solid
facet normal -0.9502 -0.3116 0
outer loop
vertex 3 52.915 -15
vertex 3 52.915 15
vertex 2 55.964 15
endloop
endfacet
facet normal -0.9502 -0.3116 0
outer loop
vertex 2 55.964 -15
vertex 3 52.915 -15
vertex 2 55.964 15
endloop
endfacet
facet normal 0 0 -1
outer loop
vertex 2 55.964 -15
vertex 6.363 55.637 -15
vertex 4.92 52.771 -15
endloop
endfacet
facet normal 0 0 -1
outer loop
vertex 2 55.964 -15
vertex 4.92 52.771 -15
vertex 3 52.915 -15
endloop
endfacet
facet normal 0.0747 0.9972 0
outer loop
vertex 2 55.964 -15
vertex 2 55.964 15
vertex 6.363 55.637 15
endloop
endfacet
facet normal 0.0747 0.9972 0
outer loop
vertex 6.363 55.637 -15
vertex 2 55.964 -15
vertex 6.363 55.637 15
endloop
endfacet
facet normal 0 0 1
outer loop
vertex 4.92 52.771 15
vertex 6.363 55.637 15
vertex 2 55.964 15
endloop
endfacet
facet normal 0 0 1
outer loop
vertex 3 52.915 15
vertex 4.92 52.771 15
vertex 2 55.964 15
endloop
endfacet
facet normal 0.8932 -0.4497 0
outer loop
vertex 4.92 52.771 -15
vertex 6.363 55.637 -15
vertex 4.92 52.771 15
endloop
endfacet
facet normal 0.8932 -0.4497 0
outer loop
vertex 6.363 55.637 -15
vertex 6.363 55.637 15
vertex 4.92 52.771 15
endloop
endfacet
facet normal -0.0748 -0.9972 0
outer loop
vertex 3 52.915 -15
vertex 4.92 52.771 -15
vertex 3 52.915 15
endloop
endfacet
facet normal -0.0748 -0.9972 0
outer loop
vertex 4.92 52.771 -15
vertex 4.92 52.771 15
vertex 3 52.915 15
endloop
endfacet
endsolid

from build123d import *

# Parameters (mm, degrees)
SKETCH_1_R      = 50
EXTRUDE_1_DEPTH = 15
SKETCH_2_R      = 50
SKETCH_2_R_2    = 15
EXTRUDE_2_DEPTH = 25
EXTRUDE_3_DEPTH = 15


with BuildPart() as part:
    # Эскиз1 → Бобышка-Вытянуть1 (new, symmetric)
    with BuildSketch(Plane.XY):
        with BuildLine():
            ThreePointArc((2, 55.964274319), (0, 56), (-2, 55.964274319))
            Line((-2, 55.964274319), (-3, 52.915026221))
            ThreePointArc((-3, 52.915026221), (-3.478337142, 52.885736931), (-3.956389894, 52.852123694))
            ThreePointArc((-3.956389894, 52.852123694), (-3.96069496, 52.851801251), (-3.965, 52.851478456))
            ThreePointArc((-3.965, 52.851478456), (-4.442723091, 52.813466195), (-4.920082944, 52.771135897))
            Line((-4.920082944, 52.771135897), (-6.363380617, 55.637284146))
            ThreePointArc((-6.363380617, 55.637284146), (-8.346366906, 55.374526269), (-10.318703922, 55.041115081))
            Line((-10.318703922, 55.041115081), (-10.853067901, 51.8768823))
            ThreePointArc((-10.853067901, 51.8768823), (-11.32169707, 51.776627695), (-11.789400575, 51.672139825))
            ThreePointArc((-11.789400575, 51.672139825), (-11.7936095, 51.671179346), (-11.797818346, 51.670218524))
            ThreePointArc((-11.797818346, 51.670218524), (-12.264540231, 51.561429896), (-12.730259365, 51.448425598))
            Line((-12.730259365, 51.448425598), (-14.584613826, 54.067448983))
            ThreePointArc((-14.584613826, 54.067448983), (-16.506289767, 53.512077124), (-18.406905049, 52.888428286))
            Line((-18.406905049, 52.888428286), (-18.4636962, 49.679894551))
            ThreePointArc((-18.4636962, 49.679894551), (-18.912148995, 49.510914154), (-19.359055529, 49.337885737))
            ThreePointArc((-19.359055529, 49.337885737), (-19.363074291, 49.336308678), (-19.367092925, 49.334731292))
            ThreePointArc((-19.367092925, 49.334731292), (-19.812387809, 49.157596456), (-20.256062829, 48.976442487))
            Line((-20.256062829, 48.976442487), (-22.480050863, 51.289836354))
            ThreePointArc((-22.480050863, 51.289836354), (-24.297489391, 50.454256603), (-26.083926334, 49.554301398))
            Line((-26.083926334, 49.554301398), (-25.661876036, 46.373140052))
            ThreePointArc((-25.661876036, 46.373140052), (-26.080134762, 46.139208606), (-26.496261172, 45.901504811))
            ThreePointArc((-26.496261172, 45.901504811), (-26.5, 45.899346401), (-26.503738652, 45.897187686))
            ThreePointArc((-26.503738652, 45.897187686), (-26.917659382, 45.655663541), (-27.32937932, 45.410406582))
            Line((-27.32937932, 45.410406582), (-29.87332071, 47.366493535))
            ThreePointArc((-29.87332071, 47.366493535), (-31.545923252, 46.269371362), (-33.178275807, 45.113213302))
            Line((-33.178275807, 45.113213302), (-32.286811966, 42.030486234))
            ThreePointArc((-32.286811966, 42.030486234), (-32.665533415, 41.73682938), (-33.041584125, 41.439760117))
            ThreePointArc((-33.041584125, 41.439760117), (-33.044959499, 41.437068571), (-33.048334653, 41.43437675))
            ThreePointArc((-33.048334653, 41.43437675), (-33.421634925, 41.133858547), (-33.792202639, 40.829977233))
            Line((-33.792202639, 40.829977233), (-36.599269937, 42.38506152))
            ThreePointArc((-36.599269937, 42.38506152), (-38.089673315, 41.050904822), (-39.531477424, 39.664370569))
            Line((-39.531477424, 39.664370569), (-38.19051387, 36.748940806))
            ThreePointArc((-38.19051387, 36.748940806), (-38.52123803, 36.402118354), (-38.848812688, 36.052319659))
            ThreePointArc((-38.848812688, 36.052319659), (-38.851749207, 36.049155102), (-38.854685469, 36.045990306))
            ThreePointArc((-38.854685469, 36.045990306), (-39.179026371, 35.693191124), (-39.50016399, 35.337473661))
            Line((-39.50016399, 35.337473661), (-42.507651952, 36.456817271))
            ThreePointArc((-42.507651952, 36.456817271), (-43.782563018, 34.915428904), (-45.001611159, 33.329491341))
            Line((-45.001611159, 33.329491341), (-43.241102801, 30.646484767))
            ThreePointArc((-43.241102801, 30.646484767), (-43.516441841, 30.254244156), (-43.788222971, 29.859529954))
            ThreePointArc((-43.788222971, 29.859529954), (-43.790655039, 29.855963077), (-43.793086816, 29.852396003))
            ThreePointArc((-43.793086816, 29.852396003), (-44.061223109, 29.455196793), (-44.32575695, 29.055589322))
            Line((-44.32575695, 29.055589322), (-47.466483264, 29.714187967))
            ThreePointArc((-47.466483264, 29.714187967), (-48.497422612, 28), (-49.466483264, 26.250086352))
            Line((-49.466483264, 26.250086352), (-47.32575695, 23.859436899))
            ThreePointArc((-47.32575695, 23.859436899), (-47.539560251, 23.430540138), (-47.74947671, 22.999727692))
            ThreePointArc((-47.74947671, 22.999727692), (-47.751349999, 22.995838173), (-47.753222971, 22.991948502))
            ThreePointArc((-47.753222971, 22.991948502), (-47.959164932, 22.559222039), (-48.161185745, 22.12465113))
            Line((-48.161185745, 22.12465113), (-51.364991776, 22.307792805))
            ThreePointArc((-51.364991776, 22.307792805), (-52.128929924, 20.459097365), (-52.826355874, 18.58429781))
            Line((-52.826355874, 18.58429781), (-50.353231891, 16.539408638))
            ThreePointArc((-50.353231891, 16.539408638), (-50.500723441, 16.083436571), (-50.644086044, 15.626149519))
            ThreePointArc((-50.644086044, 15.626149519), (-50.645358707, 15.622024244), (-50.646631033, 15.617898865))
            ThreePointArc((-50.646631033, 15.617898865), (-50.785778261, 15.159311542), (-50.920773235, 14.699484792))
            Line((-50.920773235, 14.699484792), (-54.11609125, 14.403078414))
            ThreePointArc((-54.11609125, 14.403078414), (-54.595963082, 12.461172302), (-55.006174986, 10.503366765))
            Line((-55.006174986, 10.503366765), (-52.255898839, 8.849917319))
            ThreePointArc((-52.255898839, 8.849917319), (-52.33378392, 8.377055607), (-52.407390182, 7.903508987))
            ThreePointArc((-52.407390182, 7.903508987), (-52.40803379, 7.899240107), (-52.40867705, 7.894971175))
            ThreePointArc((-52.40867705, 7.894971175), (-52.477921224, 7.420767076), (-52.542874795, 6.945956253))
            Line((-52.542874795, 6.945956253), (-55.65832667, 6.176623052))
            ThreePointArc((-55.65832667, 6.176623052), (-55.843412642, 4.184885241), (-55.957247044, 2.187807863))
            Line((-55.957247044, 2.187807863), (-52.991255357, 0.96273347))
            ThreePointArc((-52.991255357, 0.96273347), (-52.997794144, 0.483545065), (-52.999999824, 0.004317125))
            ThreePointArc((-52.999999824, 0.004317125), (-53, 0), (-52.999999824, -0.004317125))
            ThreePointArc((-52.999999824, -0.004317125), (-52.997794144, -0.483545065), (-52.991255357, -0.96273347))
            Line((-52.991255357, -0.96273347), (-55.957247044, -2.187807863))
            ThreePointArc((-55.957247044, -2.187807863), (-55.843412642, -4.184885241), (-55.65832667, -6.176623052))
            Line((-55.65832667, -6.176623052), (-52.542874795, -6.945956253))
            ThreePointArc((-52.542874795, -6.945956253), (-52.477921224, -7.420767076), (-52.40867705, -7.894971175))
            ThreePointArc((-52.40867705, -7.894971175), (-52.40803379, -7.899240107), (-52.407390182, -7.903508987))
            ThreePointArc((-52.407390182, -7.903508987), (-52.33378392, -8.377055607), (-52.255898839, -8.849917319))
            Line((-52.255898839, -8.849917319), (-55.006174986, -10.503366765))
            ThreePointArc((-55.006174986, -10.503366765), (-54.595963082, -12.461172302), (-54.11609125, -14.403078414))
            Line((-54.11609125, -14.403078414), (-50.920773235, -14.699484792))
            ThreePointArc((-50.920773235, -14.699484792), (-50.785778261, -15.159311542), (-50.646631033, -15.617898865))
            ThreePointArc((-50.646631033, -15.617898865), (-50.645358707, -15.622024244), (-50.644086044, -15.626149519))
            ThreePointArc((-50.644086044, -15.626149519), (-50.500723441, -16.083436571), (-50.353231891, -16.539408638))
            Line((-50.353231891, -16.539408638), (-52.826355874, -18.58429781))
            ThreePointArc((-52.826355874, -18.58429781), (-52.128929924, -20.459097365), (-51.364991776, -22.307792805))
            Line((-51.364991776, -22.307792805), (-48.161185745, -22.12465113))
            ThreePointArc((-48.161185745, -22.12465113), (-47.959164932, -22.559222039), (-47.753222971, -22.991948502))
            ThreePointArc((-47.753222971, -22.991948502), (-47.751349999, -22.995838173), (-47.74947671, -22.999727692))
            ThreePointArc((-47.74947671, -22.999727692), (-47.539560251, -23.430540138), (-47.32575695, -23.859436899))
            Line((-47.32575695, -23.859436899), (-49.466483264, -26.250086352))
            ThreePointArc((-49.466483264, -26.250086352), (-48.497422612, -28), (-47.466483264, -29.714187967))
            Line((-47.466483264, -29.714187967), (-44.32575695, -29.055589322))
            ThreePointArc((-44.32575695, -29.055589322), (-44.061223109, -29.455196793), (-43.793086816, -29.852396003))
            ThreePointArc((-43.793086816, -29.852396003), (-43.790655039, -29.855963077), (-43.788222971, -29.859529954))
            ThreePointArc((-43.788222971, -29.859529954), (-43.516441841, -30.254244156), (-43.241102801, -30.646484767))
            Line((-43.241102801, -30.646484767), (-45.001611159, -33.329491341))
            ThreePointArc((-45.001611159, -33.329491341), (-43.782563018, -34.915428904), (-42.507651952, -36.456817271))
            Line((-42.507651952, -36.456817271), (-39.50016399, -35.337473661))
            ThreePointArc((-39.50016399, -35.337473661), (-39.179026371, -35.693191124), (-38.854685469, -36.045990306))
            ThreePointArc((-38.854685469, -36.045990306), (-38.851749207, -36.049155102), (-38.848812688, -36.052319659))
            ThreePointArc((-38.848812688, -36.052319659), (-38.52123803, -36.402118354), (-38.19051387, -36.748940806))
            Line((-38.19051387, -36.748940806), (-39.531477424, -39.664370569))
            ThreePointArc((-39.531477424, -39.664370569), (-38.089673315, -41.050904822), (-36.599269937, -42.38506152))
            Line((-36.599269937, -42.38506152), (-33.792202639, -40.829977233))
            ThreePointArc((-33.792202639, -40.829977233), (-33.421634925, -41.133858547), (-33.048334653, -41.43437675))
            ThreePointArc((-33.048334653, -41.43437675), (-33.044959499, -41.437068571), (-33.041584125, -41.439760117))
            ThreePointArc((-33.041584125, -41.439760117), (-32.665533415, -41.73682938), (-32.286811966, -42.030486234))
            Line((-32.286811966, -42.030486234), (-33.178275807, -45.113213302))
            ThreePointArc((-33.178275807, -45.113213302), (-31.545923252, -46.269371362), (-29.87332071, -47.366493535))
            Line((-29.87332071, -47.366493535), (-27.32937932, -45.410406582))
            ThreePointArc((-27.32937932, -45.410406582), (-26.917659382, -45.655663541), (-26.503738652, -45.897187686))
            ThreePointArc((-26.503738652, -45.897187686), (-26.5, -45.899346401), (-26.496261172, -45.901504811))
            ThreePointArc((-26.496261172, -45.901504811), (-26.080134762, -46.139208606), (-25.661876036, -46.373140052))
            Line((-25.661876036, -46.373140052), (-26.083926334, -49.554301398))
            ThreePointArc((-26.083926334, -49.554301398), (-24.297489391, -50.454256603), (-22.480050863, -51.289836354))
            Line((-22.480050863, -51.289836354), (-20.256062829, -48.976442487))
            ThreePointArc((-20.256062829, -48.976442487), (-19.812387809, -49.157596456), (-19.367092925, -49.334731292))
            ThreePointArc((-19.367092925, -49.334731292), (-19.363074291, -49.336308678), (-19.359055529, -49.337885737))
            ThreePointArc((-19.359055529, -49.337885737), (-18.912148995, -49.510914154), (-18.4636962, -49.679894551))
            Line((-18.4636962, -49.679894551), (-18.406905049, -52.888428286))
            ThreePointArc((-18.406905049, -52.888428286), (-16.506289767, -53.512077124), (-14.584613826, -54.067448983))
            Line((-14.584613826, -54.067448983), (-12.730259365, -51.448425598))
            ThreePointArc((-12.730259365, -51.448425598), (-12.264540231, -51.561429896), (-11.797818346, -51.670218524))
            ThreePointArc((-11.797818346, -51.670218524), (-11.7936095, -51.671179346), (-11.789400575, -51.672139825))
            ThreePointArc((-11.789400575, -51.672139825), (-11.32169707, -51.776627695), (-10.853067901, -51.8768823))
            Line((-10.853067901, -51.8768823), (-10.318703922, -55.041115081))
            ThreePointArc((-10.318703922, -55.041115081), (-8.346366906, -55.374526269), (-6.363380617, -55.637284146))
            Line((-6.363380617, -55.637284146), (-4.920082944, -52.771135897))
            ThreePointArc((-4.920082944, -52.771135897), (-4.442723091, -52.813466195), (-3.965, -52.851478456))
            ThreePointArc((-3.965, -52.851478456), (-3.96069496, -52.851801251), (-3.956389894, -52.852123694))
            ThreePointArc((-3.956389894, -52.852123694), (-3.478337142, -52.885736931), (-3, -52.915026221))
            Line((-3, -52.915026221), (-2, -55.964274319))
            ThreePointArc((-2, -55.964274319), (0, -56), (2, -55.964274319))
            Line((2, -55.964274319), (3, -52.915026221))
            ThreePointArc((3, -52.915026221), (3.478337142, -52.885736931), (3.956389894, -52.852123694))
            ThreePointArc((3.956389894, -52.852123694), (3.96069496, -52.851801251), (3.965, -52.851478456))
            ThreePointArc((3.965, -52.851478456), (4.442723091, -52.813466195), (4.920082944, -52.771135897))
            Line((4.920082944, -52.771135897), (6.363380617, -55.637284146))
            ThreePointArc((6.363380617, -55.637284146), (8.346366906, -55.374526269), (10.318703922, -55.041115081))
            Line((10.318703922, -55.041115081), (10.853067901, -51.8768823))
            ThreePointArc((10.853067901, -51.8768823), (11.32169707, -51.776627695), (11.789400575, -51.672139825))
            ThreePointArc((11.789400575, -51.672139825), (11.7936095, -51.671179346), (11.797818346, -51.670218524))
            ThreePointArc((11.797818346, -51.670218524), (12.264540231, -51.561429896), (12.730259365, -51.448425598))
            Line((12.730259365, -51.448425598), (14.584613826, -54.067448983))
            ThreePointArc((14.584613826, -54.067448983), (16.506289767, -53.512077124), (18.406905049, -52.888428286))
            Line((18.406905049, -52.888428286), (18.4636962, -49.679894551))
            ThreePointArc((18.4636962, -49.679894551), (18.912148995, -49.510914154), (19.359055529, -49.337885737))
            ThreePointArc((19.359055529, -49.337885737), (19.363074291, -49.336308678), (19.367092925, -49.334731292))
            ThreePointArc((19.367092925, -49.334731292), (19.812387809, -49.157596456), (20.256062829, -48.976442487))
            Line((20.256062829, -48.976442487), (22.480050863, -51.289836354))
            ThreePointArc((22.480050863, -51.289836354), (24.297489391, -50.454256603), (26.083926334, -49.554301398))
            Line((26.083926334, -49.554301398), (25.661876036, -46.373140052))
            ThreePointArc((25.661876036, -46.373140052), (26.080134762, -46.139208606), (26.496261172, -45.901504811))
            ThreePointArc((26.496261172, -45.901504811), (26.5, -45.899346401), (26.503738652, -45.897187686))
            ThreePointArc((26.503738652, -45.897187686), (26.917659382, -45.655663541), (27.32937932, -45.410406582))
            Line((27.32937932, -45.410406582), (29.87332071, -47.366493535))
            ThreePointArc((29.87332071, -47.366493535), (31.545923252, -46.269371362), (33.178275807, -45.113213302))
            Line((33.178275807, -45.113213302), (32.286811966, -42.030486234))
            ThreePointArc((32.286811966, -42.030486234), (32.665533415, -41.73682938), (33.041584125, -41.439760117))
            ThreePointArc((33.041584125, -41.439760117), (33.044959499, -41.437068571), (33.048334653, -41.43437675))
            ThreePointArc((33.048334653, -41.43437675), (33.421634925, -41.133858547), (33.792202639, -40.829977233))
            Line((33.792202639, -40.829977233), (36.599269937, -42.38506152))
            ThreePointArc((36.599269937, -42.38506152), (38.089673315, -41.050904822), (39.531477424, -39.664370569))
            Line((39.531477424, -39.664370569), (38.19051387, -36.748940806))
            ThreePointArc((38.19051387, -36.748940806), (38.52123803, -36.402118354), (38.848812688, -36.052319659))
            ThreePointArc((38.848812688, -36.052319659), (38.851749207, -36.049155102), (38.854685469, -36.045990306))
            ThreePointArc((38.854685469, -36.045990306), (39.179026371, -35.693191124), (39.50016399, -35.337473661))
            Line((39.50016399, -35.337473661), (42.507651952, -36.456817271))
            ThreePointArc((42.507651952, -36.456817271), (43.782563018, -34.915428904), (45.001611159, -33.329491341))
            Line((45.001611159, -33.329491341), (43.241102801, -30.646484767))
            ThreePointArc((43.241102801, -30.646484767), (43.516441841, -30.254244156), (43.788222971, -29.859529954))
            ThreePointArc((43.788222971, -29.859529954), (43.790655039, -29.855963077), (43.793086816, -29.852396003))
            ThreePointArc((43.793086816, -29.852396003), (44.061223109, -29.455196793), (44.32575695, -29.055589322))
            Line((44.32575695, -29.055589322), (47.466483264, -29.714187967))
            ThreePointArc((47.466483264, -29.714187967), (48.497422612, -28), (49.466483264, -26.250086352))
            Line((49.466483264, -26.250086352), (47.32575695, -23.859436899))
            ThreePointArc((47.32575695, -23.859436899), (47.539560251, -23.430540138), (47.74947671, -22.999727692))
            ThreePointArc((47.74947671, -22.999727692), (47.751349999, -22.995838173), (47.753222971, -22.991948502))
            ThreePointArc((47.753222971, -22.991948502), (47.959164932, -22.559222039), (48.161185745, -22.12465113))
            Line((48.161185745, -22.12465113), (51.364991776, -22.307792805))
            ThreePointArc((51.364991776, -22.307792805), (52.128929924, -20.459097365), (52.826355874, -18.58429781))
            Line((52.826355874, -18.58429781), (50.353231891, -16.539408638))
            ThreePointArc((50.353231891, -16.539408638), (50.500723441, -16.083436571), (50.644086044, -15.626149519))
            ThreePointArc((50.644086044, -15.626149519), (50.645358707, -15.622024244), (50.646631033, -15.617898865))
            ThreePointArc((50.646631033, -15.617898865), (50.785778261, -15.159311542), (50.920773235, -14.699484792))
            Line((50.920773235, -14.699484792), (54.11609125, -14.403078414))
            ThreePointArc((54.11609125, -14.403078414), (54.595963082, -12.461172302), (55.006174986, -10.503366765))
            Line((55.006174986, -10.503366765), (52.255898839, -8.849917319))
            ThreePointArc((52.255898839, -8.849917319), (52.33378392, -8.377055607), (52.407390182, -7.903508987))
            ThreePointArc((52.407390182, -7.903508987), (52.40803379, -7.899240107), (52.40867705, -7.894971175))
            ThreePointArc((52.40867705, -7.894971175), (52.477921224, -7.420767076), (52.542874795, -6.945956253))
            Line((52.542874795, -6.945956253), (55.65832667, -6.176623052))
            ThreePointArc((55.65832667, -6.176623052), (55.843412642, -4.184885241), (55.957247044, -2.187807863))
            Line((55.957247044, -2.187807863), (52.991255357, -0.96273347))
            ThreePointArc((52.991255357, -0.96273347), (52.997794144, -0.483545065), (52.999999824, -0.004317125))
            ThreePointArc((52.999999824, -0.004317125), (53, 0), (52.999999824, 0.004317125))
            ThreePointArc((52.999999824, 0.004317125), (52.997794144, 0.483545065), (52.991255357, 0.96273347))
            Line((52.991255357, 0.96273347), (55.957247044, 2.187807863))
            ThreePointArc((55.957247044, 2.187807863), (55.843412642, 4.184885241), (55.65832667, 6.176623052))
            Line((55.65832667, 6.176623052), (52.542874795, 6.945956253))
            ThreePointArc((52.542874795, 6.945956253), (52.477921224, 7.420767076), (52.40867705, 7.894971175))
            ThreePointArc((52.40867705, 7.894971175), (52.40803379, 7.899240107), (52.407390182, 7.903508987))
            ThreePointArc((52.407390182, 7.903508987), (52.33378392, 8.377055607), (52.255898839, 8.849917319))
            Line((52.255898839, 8.849917319), (55.006174986, 10.503366765))
            ThreePointArc((55.006174986, 10.503366765), (54.595963082, 12.461172302), (54.11609125, 14.403078414))
            Line((54.11609125, 14.403078414), (50.920773235, 14.699484792))
            ThreePointArc((50.920773235, 14.699484792), (50.785778261, 15.159311542), (50.646631033, 15.617898865))
            ThreePointArc((50.646631033, 15.617898865), (50.645358707, 15.622024244), (50.644086044, 15.626149519))
            ThreePointArc((50.644086044, 15.626149519), (50.500723441, 16.083436571), (50.353231891, 16.539408638))
            Line((50.353231891, 16.539408638), (52.826355874, 18.58429781))
            ThreePointArc((52.826355874, 18.58429781), (52.128929924, 20.459097365), (51.364991776, 22.307792805))
            Line((51.364991776, 22.307792805), (48.161185745, 22.12465113))
            ThreePointArc((48.161185745, 22.12465113), (47.959164932, 22.559222039), (47.753222971, 22.991948502))
            ThreePointArc((47.753222971, 22.991948502), (47.751349999, 22.995838173), (47.74947671, 22.999727692))
            ThreePointArc((47.74947671, 22.999727692), (47.539560251, 23.430540138), (47.32575695, 23.859436899))
            Line((47.32575695, 23.859436899), (49.466483264, 26.250086352))
            ThreePointArc((49.466483264, 26.250086352), (48.497422612, 28), (47.466483264, 29.714187967))
            Line((47.466483264, 29.714187967), (44.32575695, 29.055589322))
            ThreePointArc((44.32575695, 29.055589322), (44.061223109, 29.455196793), (43.793086816, 29.852396003))
            ThreePointArc((43.793086816, 29.852396003), (43.790655039, 29.855963077), (43.788222971, 29.859529954))
            ThreePointArc((43.788222971, 29.859529954), (43.516441841, 30.254244156), (43.241102801, 30.646484767))
            Line((43.241102801, 30.646484767), (45.001611159, 33.329491341))
            ThreePointArc((45.001611159, 33.329491341), (43.782563018, 34.915428904), (42.507651952, 36.456817271))
            Line((42.507651952, 36.456817271), (39.50016399, 35.337473661))
            ThreePointArc((39.50016399, 35.337473661), (39.179026371, 35.693191124), (38.854685469, 36.045990306))
            ThreePointArc((38.854685469, 36.045990306), (38.851749207, 36.049155102), (38.848812688, 36.052319659))
            ThreePointArc((38.848812688, 36.052319659), (38.52123803, 36.402118354), (38.19051387, 36.748940806))
            Line((38.19051387, 36.748940806), (39.531477424, 39.664370569))
            ThreePointArc((39.531477424, 39.664370569), (38.089673315, 41.050904822), (36.599269937, 42.38506152))
            Line((36.599269937, 42.38506152), (33.792202639, 40.829977233))
            ThreePointArc((33.792202639, 40.829977233), (33.421634925, 41.133858547), (33.048334653, 41.43437675))
            ThreePointArc((33.048334653, 41.43437675), (33.044959499, 41.437068571), (33.041584125, 41.439760117))
            ThreePointArc((33.041584125, 41.439760117), (32.665533415, 41.73682938), (32.286811966, 42.030486234))
            Line((32.286811966, 42.030486234), (33.178275807, 45.113213302))
            ThreePointArc((33.178275807, 45.113213302), (31.545923252, 46.269371362), (29.87332071, 47.366493535))
            Line((29.87332071, 47.366493535), (27.32937932, 45.410406582))
            ThreePointArc((27.32937932, 45.410406582), (26.917659382, 45.655663541), (26.503738652, 45.897187686))
            ThreePointArc((26.503738652, 45.897187686), (26.5, 45.899346401), (26.496261172, 45.901504811))
            ThreePointArc((26.496261172, 45.901504811), (26.080134762, 46.139208606), (25.661876036, 46.373140052))
            Line((25.661876036, 46.373140052), (26.083926334, 49.554301398))
            ThreePointArc((26.083926334, 49.554301398), (24.297489391, 50.454256603), (22.480050863, 51.289836354))
            Line((22.480050863, 51.289836354), (20.256062829, 48.976442487))
            ThreePointArc((20.256062829, 48.976442487), (19.812387809, 49.157596456), (19.367092925, 49.334731292))
            ThreePointArc((19.367092925, 49.334731292), (19.363074291, 49.336308678), (19.359055529, 49.337885737))
            ThreePointArc((19.359055529, 49.337885737), (18.912148995, 49.510914154), (18.4636962, 49.679894551))
            Line((18.4636962, 49.679894551), (18.406905049, 52.888428286))
            ThreePointArc((18.406905049, 52.888428286), (16.506289767, 53.512077124), (14.584613826, 54.067448983))
            Line((14.584613826, 54.067448983), (12.730259365, 51.448425598))
            ThreePointArc((12.730259365, 51.448425598), (12.264540231, 51.561429896), (11.797818346, 51.670218524))
            ThreePointArc((11.797818346, 51.670218524), (11.7936095, 51.671179346), (11.789400575, 51.672139825))
            ThreePointArc((11.789400575, 51.672139825), (11.32169707, 51.776627695), (10.853067901, 51.8768823))
            Line((10.853067901, 51.8768823), (10.318703922, 55.041115081))
            ThreePointArc((10.318703922, 55.041115081), (8.346366906, 55.374526269), (6.363380617, 55.637284146))
            Line((6.363380617, 55.637284146), (4.920082944, 52.771135897))
            ThreePointArc((4.920082944, 52.771135897), (4.442723091, 52.813466195), (3.965, 52.851478456))
            ThreePointArc((3.965, 52.851478456), (3.96069496, 52.851801251), (3.956389894, 52.852123694))
            ThreePointArc((3.956389894, 52.852123694), (3.478337142, 52.885736931), (3, 52.915026221))
            Line((3, 52.915026221), (2, 55.964274319))
        make_face()
        Circle(SKETCH_1_R, mode=Mode.SUBTRACT)
    extrude(amount=EXTRUDE_1_DEPTH, both=True)

    # Эскиз2 → Бобышка-Вытянуть2 (add)
    with BuildSketch(Plane(origin=(0, 0, -15), x_dir=(-1, 0, 0), z_dir=(0, 0, -1))):
        Circle(SKETCH_2_R)
        Circle(SKETCH_2_R_2, mode=Mode.SUBTRACT)
        with BuildLine():
            Line((3.453748068, 43), (-3.453748068, 43))
            ThreePointArc((-3.453748068, 43), (-7.427281454, 41.034968275), (-8.277567174, 36.684412971))
            Line((-8.277567174, 36.684412971), (-4.803871921, 23.947530377))
            ThreePointArc((-4.803871921, 23.947530377), (-3.372791256, 21.821173291), (-0.944816636, 21))
            Line((-0.944816636, 21), (0.944816636, 21))
            ThreePointArc((0.944816636, 21), (3.372791256, 21.821173291), (4.803871921, 23.947530377))
            Line((4.803871921, 23.947530377), (8.277567174, 36.684412971))
            ThreePointArc((8.277567174, 36.684412971), (7.427281454, 41.034968275), (3.453748068, 43))
        make_face(mode=Mode.SUBTRACT)
        with BuildLine():
            Line((41.962697048, 10.003021153), (39.828163353, 16.572440364))
            ThreePointArc((39.828163353, 16.572440364), (36.731417782, 19.744266986), (32.331041074, 19.208541237))
            Line((32.331041074, 19.208541237), (21.290976752, 11.968947554))
            ThreePointArc((21.290976752, 11.968947554), (19.710919235, 9.950828486), (19.680222445, 7.3879309))
            Line((19.680222445, 7.3879309), (20.264151239, 5.590782863))
            ThreePointArc((20.264151239, 5.590782863), (21.795418868, 3.535398282), (24.259932876, 2.831440166))
            Line((24.259932876, 2.831440166), (37.446858931, 3.463672837))
            ThreePointArc((37.446858931, 3.463672837), (41.321730165, 5.616738135), (41.962697048, 10.003021153))
        make_face(mode=Mode.SUBTRACT)
        with BuildLine():
            Line((22.480624967, -36.817792937), (28.06890673, -32.757668579))
            ThreePointArc((28.06890673, -32.757668579), (30.128546098, -28.832340194), (28.259249449, -24.812881613))
            Line((28.259249449, -24.812881613), (17.962419207, -16.550313979))
            ThreePointArc((17.962419207, -16.550313979), (15.554809292, -15.67122307), (13.107863013, -16.434007597))
            Line((13.107863013, -16.434007597), (11.579117583, -17.544706167))
            ThreePointArc((11.579117583, -17.544706167), (10.097518404, -19.636176989), (10.189591161, -22.197604117))
            Line((10.189591161, -22.197604117), (14.865864418, -34.543745432))
            ThreePointArc((14.865864418, -34.543745432), (18.110952262, -37.563633201), (22.480624967, -36.817792937))
        make_face(mode=Mode.SUBTRACT)
        with BuildLine():
            Line((-28.06890673, -32.757668579), (-22.480624967, -36.817792937))
            ThreePointArc((-22.480624967, -36.817792937), (-18.110952262, -37.563633201), (-14.865864418, -34.543745432))
            Line((-14.865864418, -34.543745432), (-10.189591161, -22.197604117))
            ThreePointArc((-10.189591161, -22.197604117), (-10.097518404, -19.636176989), (-11.579117583, -17.544706167))
            Line((-11.579117583, -17.544706167), (-13.107863013, -16.434007597))
            ThreePointArc((-13.107863013, -16.434007597), (-15.554809292, -15.67122307), (-17.962419207, -16.550313979))
            Line((-17.962419207, -16.550313979), (-28.259249449, -24.812881613))
            ThreePointArc((-28.259249449, -24.812881613), (-30.128546098, -28.832340194), (-28.06890673, -32.757668579))
        make_face(mode=Mode.SUBTRACT)
        with BuildLine():
            Line((-39.828163353, 16.572440364), (-41.962697048, 10.003021153))
            ThreePointArc((-41.962697048, 10.003021153), (-41.321730165, 5.616738135), (-37.446858931, 3.463672837))
            Line((-37.446858931, 3.463672837), (-24.259932876, 2.831440166))
            ThreePointArc((-24.259932876, 2.831440166), (-21.795418868, 3.535398282), (-20.264151239, 5.590782863))
            Line((-20.264151239, 5.590782863), (-19.680222445, 7.3879309))
            ThreePointArc((-19.680222445, 7.3879309), (-19.710919235, 9.950828486), (-21.290976752, 11.968947554))
            Line((-21.290976752, 11.968947554), (-32.331041074, 19.208541237))
            ThreePointArc((-32.331041074, 19.208541237), (-36.731417782, 19.744266986), (-39.828163353, 16.572440364))
        make_face(mode=Mode.SUBTRACT)
    extrude(amount=-EXTRUDE_2_DEPTH)


with BuildPart() as body_2:
    # Эскиз3 → Бобышка-Вытянуть3 (new, symmetric)
    with BuildSketch(Plane.XY):
        Polygon((2, 55.964274319), (6.363380617, 55.637284146), (4.920082944, 52.771135897), (3, 52.915026221), align=None)
    extrude(amount=EXTRUDE_3_DEPTH, both=True)


solid = body_2.part
